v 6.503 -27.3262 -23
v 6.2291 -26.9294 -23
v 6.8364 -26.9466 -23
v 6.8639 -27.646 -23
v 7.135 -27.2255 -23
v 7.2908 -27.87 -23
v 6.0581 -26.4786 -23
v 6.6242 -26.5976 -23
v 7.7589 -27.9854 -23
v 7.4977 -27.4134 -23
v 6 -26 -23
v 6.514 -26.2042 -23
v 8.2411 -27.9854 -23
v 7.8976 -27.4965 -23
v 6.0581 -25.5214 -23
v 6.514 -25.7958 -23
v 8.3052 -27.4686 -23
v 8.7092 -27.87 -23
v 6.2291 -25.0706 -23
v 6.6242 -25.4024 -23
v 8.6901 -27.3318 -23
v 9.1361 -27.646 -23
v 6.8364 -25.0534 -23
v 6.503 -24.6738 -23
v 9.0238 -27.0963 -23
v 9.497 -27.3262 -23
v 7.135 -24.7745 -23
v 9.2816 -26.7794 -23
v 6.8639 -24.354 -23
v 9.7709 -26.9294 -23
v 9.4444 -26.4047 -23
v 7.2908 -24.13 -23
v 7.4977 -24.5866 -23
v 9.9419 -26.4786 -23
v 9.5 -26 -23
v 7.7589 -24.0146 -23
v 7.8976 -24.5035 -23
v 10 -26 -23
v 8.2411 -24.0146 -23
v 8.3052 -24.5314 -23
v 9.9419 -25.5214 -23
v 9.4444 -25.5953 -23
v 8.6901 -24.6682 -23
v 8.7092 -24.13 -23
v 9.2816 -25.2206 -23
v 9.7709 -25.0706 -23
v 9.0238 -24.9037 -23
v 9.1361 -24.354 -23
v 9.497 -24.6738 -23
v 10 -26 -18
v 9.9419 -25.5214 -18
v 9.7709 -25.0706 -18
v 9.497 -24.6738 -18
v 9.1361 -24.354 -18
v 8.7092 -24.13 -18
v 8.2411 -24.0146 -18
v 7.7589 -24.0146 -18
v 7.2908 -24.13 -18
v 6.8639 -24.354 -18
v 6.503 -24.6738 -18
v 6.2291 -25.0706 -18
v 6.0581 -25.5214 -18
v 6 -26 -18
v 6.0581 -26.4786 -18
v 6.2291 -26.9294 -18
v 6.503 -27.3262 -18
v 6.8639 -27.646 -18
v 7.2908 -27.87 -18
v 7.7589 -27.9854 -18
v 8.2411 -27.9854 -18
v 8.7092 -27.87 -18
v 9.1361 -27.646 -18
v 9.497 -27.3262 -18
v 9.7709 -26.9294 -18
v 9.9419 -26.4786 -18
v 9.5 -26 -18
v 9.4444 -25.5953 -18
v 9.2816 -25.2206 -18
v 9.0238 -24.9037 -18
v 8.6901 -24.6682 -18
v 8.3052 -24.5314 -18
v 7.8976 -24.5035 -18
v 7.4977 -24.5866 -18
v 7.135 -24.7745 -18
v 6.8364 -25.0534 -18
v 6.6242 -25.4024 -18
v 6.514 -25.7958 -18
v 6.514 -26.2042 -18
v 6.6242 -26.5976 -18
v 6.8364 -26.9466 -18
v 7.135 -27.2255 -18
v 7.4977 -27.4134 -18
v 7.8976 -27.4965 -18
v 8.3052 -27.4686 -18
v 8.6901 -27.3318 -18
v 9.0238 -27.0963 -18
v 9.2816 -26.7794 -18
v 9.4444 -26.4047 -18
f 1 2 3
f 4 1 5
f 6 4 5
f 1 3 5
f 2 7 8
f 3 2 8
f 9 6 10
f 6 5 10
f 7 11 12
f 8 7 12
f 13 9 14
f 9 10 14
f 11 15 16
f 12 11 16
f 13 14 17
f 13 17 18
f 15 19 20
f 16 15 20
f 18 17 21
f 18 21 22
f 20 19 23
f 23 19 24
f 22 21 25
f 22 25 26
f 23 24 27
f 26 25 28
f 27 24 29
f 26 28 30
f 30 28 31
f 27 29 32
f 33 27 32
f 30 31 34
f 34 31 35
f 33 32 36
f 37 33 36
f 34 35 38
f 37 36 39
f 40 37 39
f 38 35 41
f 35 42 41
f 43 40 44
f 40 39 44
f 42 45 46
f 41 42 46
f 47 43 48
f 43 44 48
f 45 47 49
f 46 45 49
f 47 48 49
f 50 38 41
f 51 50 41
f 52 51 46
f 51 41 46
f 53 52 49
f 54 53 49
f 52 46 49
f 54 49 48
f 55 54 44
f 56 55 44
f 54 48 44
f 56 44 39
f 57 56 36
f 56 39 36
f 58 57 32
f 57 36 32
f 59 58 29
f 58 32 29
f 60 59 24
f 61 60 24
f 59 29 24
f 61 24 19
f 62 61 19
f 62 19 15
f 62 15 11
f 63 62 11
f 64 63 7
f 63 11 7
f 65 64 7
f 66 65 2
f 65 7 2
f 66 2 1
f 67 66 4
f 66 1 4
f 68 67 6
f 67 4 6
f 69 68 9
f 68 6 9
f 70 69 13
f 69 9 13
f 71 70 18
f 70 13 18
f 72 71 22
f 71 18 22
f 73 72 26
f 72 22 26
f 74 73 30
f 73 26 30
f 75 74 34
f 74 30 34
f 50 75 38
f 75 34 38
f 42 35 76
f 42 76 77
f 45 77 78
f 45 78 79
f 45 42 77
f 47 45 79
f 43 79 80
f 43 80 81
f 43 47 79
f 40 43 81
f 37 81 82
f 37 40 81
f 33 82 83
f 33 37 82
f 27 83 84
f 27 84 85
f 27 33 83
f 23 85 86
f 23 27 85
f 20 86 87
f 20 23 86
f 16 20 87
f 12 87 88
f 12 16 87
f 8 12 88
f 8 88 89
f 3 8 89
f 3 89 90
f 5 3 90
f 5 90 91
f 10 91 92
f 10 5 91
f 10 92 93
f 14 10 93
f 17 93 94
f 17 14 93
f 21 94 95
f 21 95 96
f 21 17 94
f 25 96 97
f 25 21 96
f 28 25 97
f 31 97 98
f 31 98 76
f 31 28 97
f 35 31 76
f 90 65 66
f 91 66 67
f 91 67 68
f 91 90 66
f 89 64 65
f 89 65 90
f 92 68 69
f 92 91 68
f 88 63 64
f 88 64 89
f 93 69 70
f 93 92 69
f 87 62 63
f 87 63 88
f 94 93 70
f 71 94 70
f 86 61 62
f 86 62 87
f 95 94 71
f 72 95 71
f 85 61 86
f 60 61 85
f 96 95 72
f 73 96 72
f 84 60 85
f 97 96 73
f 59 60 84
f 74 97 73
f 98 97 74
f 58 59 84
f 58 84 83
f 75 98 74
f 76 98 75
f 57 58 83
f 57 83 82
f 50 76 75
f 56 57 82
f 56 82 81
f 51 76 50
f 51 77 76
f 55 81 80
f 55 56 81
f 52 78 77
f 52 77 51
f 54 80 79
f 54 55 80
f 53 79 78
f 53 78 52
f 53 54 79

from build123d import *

# Parameters (mm, degrees)
CYLINDER_R        = 1.5
CYLINDER_DEPTH    = 5
CYLINDER001_R     = 2
CYLINDER001_DEPTH = 5


with BuildPart() as cylinderouter:
    # Cylinder → Cylinder (new body)
    with BuildSketch(Plane(origin=(8, -26, -23), x_dir=(1, 0, 0), z_dir=(0, 0, 1))):
        Circle(CYLINDER_R)
    extrude(amount=CYLINDER_DEPTH)


with BuildPart() as espsup001:
    # Cylinder001 → Cylinder001 (new body)
    with BuildSketch(Plane(origin=(8, -26, -23), x_dir=(1, 0, 0), z_dir=(0, 0, 1))):
        Circle(CYLINDER001_R)
    extrude(amount=CYLINDER001_DEPTH)

    # Cut001: cut CylinderOuter
    add(cylinderouter.part, mode=Mode.SUBTRACT)


solid = espsup001.part
